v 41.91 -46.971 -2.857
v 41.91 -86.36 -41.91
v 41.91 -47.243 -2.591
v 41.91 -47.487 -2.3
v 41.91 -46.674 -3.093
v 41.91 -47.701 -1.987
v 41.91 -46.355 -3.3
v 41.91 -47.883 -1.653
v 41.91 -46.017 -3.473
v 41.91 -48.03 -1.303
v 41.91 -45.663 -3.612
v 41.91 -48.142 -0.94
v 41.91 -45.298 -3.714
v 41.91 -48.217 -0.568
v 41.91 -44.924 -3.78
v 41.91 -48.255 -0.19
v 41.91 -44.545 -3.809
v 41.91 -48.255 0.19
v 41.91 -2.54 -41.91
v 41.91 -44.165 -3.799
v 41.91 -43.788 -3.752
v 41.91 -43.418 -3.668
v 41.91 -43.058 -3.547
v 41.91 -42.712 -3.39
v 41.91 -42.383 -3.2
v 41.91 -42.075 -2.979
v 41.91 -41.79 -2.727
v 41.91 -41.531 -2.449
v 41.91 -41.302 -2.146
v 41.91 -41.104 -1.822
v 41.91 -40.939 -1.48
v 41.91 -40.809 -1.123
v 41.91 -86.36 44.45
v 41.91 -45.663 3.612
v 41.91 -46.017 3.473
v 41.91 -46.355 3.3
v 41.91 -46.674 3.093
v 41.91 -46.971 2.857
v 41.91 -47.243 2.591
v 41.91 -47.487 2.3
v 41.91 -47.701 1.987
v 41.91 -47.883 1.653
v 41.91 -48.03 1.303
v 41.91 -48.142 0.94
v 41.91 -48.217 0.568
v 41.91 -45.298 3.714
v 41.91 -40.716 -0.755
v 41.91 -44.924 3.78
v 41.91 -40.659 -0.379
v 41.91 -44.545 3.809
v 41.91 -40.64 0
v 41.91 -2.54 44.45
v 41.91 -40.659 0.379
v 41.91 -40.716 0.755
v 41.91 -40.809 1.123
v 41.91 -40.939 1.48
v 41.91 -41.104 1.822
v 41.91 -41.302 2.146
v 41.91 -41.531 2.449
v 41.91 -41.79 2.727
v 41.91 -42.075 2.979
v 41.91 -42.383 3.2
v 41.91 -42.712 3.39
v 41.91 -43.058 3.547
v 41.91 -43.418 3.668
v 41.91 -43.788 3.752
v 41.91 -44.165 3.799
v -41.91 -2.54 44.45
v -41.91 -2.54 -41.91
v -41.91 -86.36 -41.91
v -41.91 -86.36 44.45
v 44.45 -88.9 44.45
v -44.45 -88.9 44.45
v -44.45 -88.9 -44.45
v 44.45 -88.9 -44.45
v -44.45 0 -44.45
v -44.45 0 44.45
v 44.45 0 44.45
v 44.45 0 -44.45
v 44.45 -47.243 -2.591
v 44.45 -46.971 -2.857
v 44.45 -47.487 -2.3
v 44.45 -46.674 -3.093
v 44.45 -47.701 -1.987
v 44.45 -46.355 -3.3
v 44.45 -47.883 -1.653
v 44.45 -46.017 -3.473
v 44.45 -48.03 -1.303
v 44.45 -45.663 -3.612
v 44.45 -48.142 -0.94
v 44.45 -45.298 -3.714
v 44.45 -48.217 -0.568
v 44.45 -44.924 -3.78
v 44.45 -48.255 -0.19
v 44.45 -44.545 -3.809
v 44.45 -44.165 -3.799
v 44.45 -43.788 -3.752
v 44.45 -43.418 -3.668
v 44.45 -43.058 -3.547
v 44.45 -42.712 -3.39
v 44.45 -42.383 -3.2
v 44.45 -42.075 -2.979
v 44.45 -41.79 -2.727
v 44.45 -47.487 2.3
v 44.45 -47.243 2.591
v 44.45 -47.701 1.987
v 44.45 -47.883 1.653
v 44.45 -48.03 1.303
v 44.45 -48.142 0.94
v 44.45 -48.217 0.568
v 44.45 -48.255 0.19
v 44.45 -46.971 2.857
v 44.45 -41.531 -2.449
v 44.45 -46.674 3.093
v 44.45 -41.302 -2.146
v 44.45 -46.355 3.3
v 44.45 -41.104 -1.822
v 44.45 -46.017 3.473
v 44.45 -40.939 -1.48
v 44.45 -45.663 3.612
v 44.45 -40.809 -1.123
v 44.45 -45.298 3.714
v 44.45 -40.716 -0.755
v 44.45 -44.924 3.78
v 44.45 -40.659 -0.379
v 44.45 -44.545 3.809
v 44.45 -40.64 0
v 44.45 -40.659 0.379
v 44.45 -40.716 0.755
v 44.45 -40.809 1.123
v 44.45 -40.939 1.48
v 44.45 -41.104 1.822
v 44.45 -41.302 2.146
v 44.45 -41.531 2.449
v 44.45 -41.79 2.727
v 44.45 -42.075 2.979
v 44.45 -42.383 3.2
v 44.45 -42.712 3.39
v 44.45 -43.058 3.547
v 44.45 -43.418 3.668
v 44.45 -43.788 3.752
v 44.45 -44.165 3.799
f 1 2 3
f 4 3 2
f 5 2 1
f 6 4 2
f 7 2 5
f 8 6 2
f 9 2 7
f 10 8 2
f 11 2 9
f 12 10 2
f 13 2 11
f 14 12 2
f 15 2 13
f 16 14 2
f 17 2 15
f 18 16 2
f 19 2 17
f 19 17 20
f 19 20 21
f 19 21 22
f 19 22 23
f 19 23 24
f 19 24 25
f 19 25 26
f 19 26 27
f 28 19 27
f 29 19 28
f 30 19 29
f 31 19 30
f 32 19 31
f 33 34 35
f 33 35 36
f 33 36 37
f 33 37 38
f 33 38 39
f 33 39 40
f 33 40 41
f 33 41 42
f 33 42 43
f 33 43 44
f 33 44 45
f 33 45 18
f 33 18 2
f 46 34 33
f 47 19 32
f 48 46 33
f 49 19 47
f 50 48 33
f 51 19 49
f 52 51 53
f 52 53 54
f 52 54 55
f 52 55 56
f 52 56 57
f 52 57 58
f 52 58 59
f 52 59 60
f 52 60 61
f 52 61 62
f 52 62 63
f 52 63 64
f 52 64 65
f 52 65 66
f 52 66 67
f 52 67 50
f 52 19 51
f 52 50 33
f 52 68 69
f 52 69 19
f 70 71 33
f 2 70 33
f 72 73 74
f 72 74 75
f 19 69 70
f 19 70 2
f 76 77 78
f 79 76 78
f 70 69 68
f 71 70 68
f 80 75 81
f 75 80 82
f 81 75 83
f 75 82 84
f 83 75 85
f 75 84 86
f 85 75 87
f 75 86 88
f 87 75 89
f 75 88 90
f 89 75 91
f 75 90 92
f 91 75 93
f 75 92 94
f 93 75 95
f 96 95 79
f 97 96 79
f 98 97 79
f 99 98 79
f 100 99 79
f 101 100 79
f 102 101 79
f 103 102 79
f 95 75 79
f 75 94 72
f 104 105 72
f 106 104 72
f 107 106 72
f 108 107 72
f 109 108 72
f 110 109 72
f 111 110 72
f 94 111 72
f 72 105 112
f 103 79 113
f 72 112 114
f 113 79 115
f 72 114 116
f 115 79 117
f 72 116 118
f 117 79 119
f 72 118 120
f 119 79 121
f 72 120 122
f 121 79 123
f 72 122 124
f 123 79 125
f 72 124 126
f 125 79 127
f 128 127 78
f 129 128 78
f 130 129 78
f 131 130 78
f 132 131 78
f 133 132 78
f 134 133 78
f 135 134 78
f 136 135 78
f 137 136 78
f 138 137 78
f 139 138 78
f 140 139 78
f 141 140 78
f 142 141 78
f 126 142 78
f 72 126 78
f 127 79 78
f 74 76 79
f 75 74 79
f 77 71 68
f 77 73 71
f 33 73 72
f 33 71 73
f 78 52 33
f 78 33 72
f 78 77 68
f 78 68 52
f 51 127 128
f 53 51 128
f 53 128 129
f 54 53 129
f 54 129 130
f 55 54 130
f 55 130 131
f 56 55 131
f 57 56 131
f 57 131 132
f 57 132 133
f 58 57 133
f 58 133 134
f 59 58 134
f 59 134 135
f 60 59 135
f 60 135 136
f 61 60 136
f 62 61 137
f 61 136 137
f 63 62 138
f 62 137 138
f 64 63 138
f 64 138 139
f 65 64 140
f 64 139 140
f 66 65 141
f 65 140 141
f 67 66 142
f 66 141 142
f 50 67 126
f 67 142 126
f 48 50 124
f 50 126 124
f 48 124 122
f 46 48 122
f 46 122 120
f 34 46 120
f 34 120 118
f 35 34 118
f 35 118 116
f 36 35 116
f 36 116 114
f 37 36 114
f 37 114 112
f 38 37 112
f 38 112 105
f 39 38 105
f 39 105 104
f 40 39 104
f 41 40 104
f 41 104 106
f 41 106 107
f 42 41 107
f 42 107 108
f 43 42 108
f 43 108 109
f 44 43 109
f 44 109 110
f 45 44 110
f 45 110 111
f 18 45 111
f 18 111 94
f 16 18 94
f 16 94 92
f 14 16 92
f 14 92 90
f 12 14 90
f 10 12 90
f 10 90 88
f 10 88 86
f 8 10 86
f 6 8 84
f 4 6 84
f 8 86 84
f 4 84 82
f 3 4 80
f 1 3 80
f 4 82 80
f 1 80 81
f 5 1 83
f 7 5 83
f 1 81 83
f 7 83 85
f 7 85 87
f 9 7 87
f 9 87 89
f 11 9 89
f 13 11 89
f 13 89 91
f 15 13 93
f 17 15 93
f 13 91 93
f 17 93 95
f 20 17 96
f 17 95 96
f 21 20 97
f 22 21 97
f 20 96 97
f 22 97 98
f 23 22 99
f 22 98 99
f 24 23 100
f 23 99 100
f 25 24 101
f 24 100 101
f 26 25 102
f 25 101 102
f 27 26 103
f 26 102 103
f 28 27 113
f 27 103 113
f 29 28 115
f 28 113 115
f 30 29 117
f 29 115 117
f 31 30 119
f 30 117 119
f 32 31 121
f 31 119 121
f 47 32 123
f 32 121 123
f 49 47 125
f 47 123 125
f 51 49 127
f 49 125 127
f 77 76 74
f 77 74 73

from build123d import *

# Parameters (mm, degrees)
F0_W     = 88.9
F0_H     = 88.9
F1_DEPTH = 88.9
F2_T     = -2.54
F3_R     = 3.81
F4_DEPTH = 25.4


with BuildPart() as f1:
    # F0 (on Front) → F1 (new body)
    with BuildSketch(Plane.XZ):
        Rectangle(F0_W, F0_H)
    extrude(amount=F1_DEPTH)

    # F2
    f2_openings = [f1.faces().sort_by_distance(p)[0] for p in [
        (0, -44.45, 44.45),
    ]]
    offset(amount=F2_T, openings=f2_openings)

    # F3 (on face) → F4 (cut)
    with BuildSketch(Plane.YZ.offset(44.45)):
        with Locations((-44.45, 0)):
            Circle(F3_R)
    extrude(amount=-F4_DEPTH, mode=Mode.SUBTRACT)


solid = f1.part
